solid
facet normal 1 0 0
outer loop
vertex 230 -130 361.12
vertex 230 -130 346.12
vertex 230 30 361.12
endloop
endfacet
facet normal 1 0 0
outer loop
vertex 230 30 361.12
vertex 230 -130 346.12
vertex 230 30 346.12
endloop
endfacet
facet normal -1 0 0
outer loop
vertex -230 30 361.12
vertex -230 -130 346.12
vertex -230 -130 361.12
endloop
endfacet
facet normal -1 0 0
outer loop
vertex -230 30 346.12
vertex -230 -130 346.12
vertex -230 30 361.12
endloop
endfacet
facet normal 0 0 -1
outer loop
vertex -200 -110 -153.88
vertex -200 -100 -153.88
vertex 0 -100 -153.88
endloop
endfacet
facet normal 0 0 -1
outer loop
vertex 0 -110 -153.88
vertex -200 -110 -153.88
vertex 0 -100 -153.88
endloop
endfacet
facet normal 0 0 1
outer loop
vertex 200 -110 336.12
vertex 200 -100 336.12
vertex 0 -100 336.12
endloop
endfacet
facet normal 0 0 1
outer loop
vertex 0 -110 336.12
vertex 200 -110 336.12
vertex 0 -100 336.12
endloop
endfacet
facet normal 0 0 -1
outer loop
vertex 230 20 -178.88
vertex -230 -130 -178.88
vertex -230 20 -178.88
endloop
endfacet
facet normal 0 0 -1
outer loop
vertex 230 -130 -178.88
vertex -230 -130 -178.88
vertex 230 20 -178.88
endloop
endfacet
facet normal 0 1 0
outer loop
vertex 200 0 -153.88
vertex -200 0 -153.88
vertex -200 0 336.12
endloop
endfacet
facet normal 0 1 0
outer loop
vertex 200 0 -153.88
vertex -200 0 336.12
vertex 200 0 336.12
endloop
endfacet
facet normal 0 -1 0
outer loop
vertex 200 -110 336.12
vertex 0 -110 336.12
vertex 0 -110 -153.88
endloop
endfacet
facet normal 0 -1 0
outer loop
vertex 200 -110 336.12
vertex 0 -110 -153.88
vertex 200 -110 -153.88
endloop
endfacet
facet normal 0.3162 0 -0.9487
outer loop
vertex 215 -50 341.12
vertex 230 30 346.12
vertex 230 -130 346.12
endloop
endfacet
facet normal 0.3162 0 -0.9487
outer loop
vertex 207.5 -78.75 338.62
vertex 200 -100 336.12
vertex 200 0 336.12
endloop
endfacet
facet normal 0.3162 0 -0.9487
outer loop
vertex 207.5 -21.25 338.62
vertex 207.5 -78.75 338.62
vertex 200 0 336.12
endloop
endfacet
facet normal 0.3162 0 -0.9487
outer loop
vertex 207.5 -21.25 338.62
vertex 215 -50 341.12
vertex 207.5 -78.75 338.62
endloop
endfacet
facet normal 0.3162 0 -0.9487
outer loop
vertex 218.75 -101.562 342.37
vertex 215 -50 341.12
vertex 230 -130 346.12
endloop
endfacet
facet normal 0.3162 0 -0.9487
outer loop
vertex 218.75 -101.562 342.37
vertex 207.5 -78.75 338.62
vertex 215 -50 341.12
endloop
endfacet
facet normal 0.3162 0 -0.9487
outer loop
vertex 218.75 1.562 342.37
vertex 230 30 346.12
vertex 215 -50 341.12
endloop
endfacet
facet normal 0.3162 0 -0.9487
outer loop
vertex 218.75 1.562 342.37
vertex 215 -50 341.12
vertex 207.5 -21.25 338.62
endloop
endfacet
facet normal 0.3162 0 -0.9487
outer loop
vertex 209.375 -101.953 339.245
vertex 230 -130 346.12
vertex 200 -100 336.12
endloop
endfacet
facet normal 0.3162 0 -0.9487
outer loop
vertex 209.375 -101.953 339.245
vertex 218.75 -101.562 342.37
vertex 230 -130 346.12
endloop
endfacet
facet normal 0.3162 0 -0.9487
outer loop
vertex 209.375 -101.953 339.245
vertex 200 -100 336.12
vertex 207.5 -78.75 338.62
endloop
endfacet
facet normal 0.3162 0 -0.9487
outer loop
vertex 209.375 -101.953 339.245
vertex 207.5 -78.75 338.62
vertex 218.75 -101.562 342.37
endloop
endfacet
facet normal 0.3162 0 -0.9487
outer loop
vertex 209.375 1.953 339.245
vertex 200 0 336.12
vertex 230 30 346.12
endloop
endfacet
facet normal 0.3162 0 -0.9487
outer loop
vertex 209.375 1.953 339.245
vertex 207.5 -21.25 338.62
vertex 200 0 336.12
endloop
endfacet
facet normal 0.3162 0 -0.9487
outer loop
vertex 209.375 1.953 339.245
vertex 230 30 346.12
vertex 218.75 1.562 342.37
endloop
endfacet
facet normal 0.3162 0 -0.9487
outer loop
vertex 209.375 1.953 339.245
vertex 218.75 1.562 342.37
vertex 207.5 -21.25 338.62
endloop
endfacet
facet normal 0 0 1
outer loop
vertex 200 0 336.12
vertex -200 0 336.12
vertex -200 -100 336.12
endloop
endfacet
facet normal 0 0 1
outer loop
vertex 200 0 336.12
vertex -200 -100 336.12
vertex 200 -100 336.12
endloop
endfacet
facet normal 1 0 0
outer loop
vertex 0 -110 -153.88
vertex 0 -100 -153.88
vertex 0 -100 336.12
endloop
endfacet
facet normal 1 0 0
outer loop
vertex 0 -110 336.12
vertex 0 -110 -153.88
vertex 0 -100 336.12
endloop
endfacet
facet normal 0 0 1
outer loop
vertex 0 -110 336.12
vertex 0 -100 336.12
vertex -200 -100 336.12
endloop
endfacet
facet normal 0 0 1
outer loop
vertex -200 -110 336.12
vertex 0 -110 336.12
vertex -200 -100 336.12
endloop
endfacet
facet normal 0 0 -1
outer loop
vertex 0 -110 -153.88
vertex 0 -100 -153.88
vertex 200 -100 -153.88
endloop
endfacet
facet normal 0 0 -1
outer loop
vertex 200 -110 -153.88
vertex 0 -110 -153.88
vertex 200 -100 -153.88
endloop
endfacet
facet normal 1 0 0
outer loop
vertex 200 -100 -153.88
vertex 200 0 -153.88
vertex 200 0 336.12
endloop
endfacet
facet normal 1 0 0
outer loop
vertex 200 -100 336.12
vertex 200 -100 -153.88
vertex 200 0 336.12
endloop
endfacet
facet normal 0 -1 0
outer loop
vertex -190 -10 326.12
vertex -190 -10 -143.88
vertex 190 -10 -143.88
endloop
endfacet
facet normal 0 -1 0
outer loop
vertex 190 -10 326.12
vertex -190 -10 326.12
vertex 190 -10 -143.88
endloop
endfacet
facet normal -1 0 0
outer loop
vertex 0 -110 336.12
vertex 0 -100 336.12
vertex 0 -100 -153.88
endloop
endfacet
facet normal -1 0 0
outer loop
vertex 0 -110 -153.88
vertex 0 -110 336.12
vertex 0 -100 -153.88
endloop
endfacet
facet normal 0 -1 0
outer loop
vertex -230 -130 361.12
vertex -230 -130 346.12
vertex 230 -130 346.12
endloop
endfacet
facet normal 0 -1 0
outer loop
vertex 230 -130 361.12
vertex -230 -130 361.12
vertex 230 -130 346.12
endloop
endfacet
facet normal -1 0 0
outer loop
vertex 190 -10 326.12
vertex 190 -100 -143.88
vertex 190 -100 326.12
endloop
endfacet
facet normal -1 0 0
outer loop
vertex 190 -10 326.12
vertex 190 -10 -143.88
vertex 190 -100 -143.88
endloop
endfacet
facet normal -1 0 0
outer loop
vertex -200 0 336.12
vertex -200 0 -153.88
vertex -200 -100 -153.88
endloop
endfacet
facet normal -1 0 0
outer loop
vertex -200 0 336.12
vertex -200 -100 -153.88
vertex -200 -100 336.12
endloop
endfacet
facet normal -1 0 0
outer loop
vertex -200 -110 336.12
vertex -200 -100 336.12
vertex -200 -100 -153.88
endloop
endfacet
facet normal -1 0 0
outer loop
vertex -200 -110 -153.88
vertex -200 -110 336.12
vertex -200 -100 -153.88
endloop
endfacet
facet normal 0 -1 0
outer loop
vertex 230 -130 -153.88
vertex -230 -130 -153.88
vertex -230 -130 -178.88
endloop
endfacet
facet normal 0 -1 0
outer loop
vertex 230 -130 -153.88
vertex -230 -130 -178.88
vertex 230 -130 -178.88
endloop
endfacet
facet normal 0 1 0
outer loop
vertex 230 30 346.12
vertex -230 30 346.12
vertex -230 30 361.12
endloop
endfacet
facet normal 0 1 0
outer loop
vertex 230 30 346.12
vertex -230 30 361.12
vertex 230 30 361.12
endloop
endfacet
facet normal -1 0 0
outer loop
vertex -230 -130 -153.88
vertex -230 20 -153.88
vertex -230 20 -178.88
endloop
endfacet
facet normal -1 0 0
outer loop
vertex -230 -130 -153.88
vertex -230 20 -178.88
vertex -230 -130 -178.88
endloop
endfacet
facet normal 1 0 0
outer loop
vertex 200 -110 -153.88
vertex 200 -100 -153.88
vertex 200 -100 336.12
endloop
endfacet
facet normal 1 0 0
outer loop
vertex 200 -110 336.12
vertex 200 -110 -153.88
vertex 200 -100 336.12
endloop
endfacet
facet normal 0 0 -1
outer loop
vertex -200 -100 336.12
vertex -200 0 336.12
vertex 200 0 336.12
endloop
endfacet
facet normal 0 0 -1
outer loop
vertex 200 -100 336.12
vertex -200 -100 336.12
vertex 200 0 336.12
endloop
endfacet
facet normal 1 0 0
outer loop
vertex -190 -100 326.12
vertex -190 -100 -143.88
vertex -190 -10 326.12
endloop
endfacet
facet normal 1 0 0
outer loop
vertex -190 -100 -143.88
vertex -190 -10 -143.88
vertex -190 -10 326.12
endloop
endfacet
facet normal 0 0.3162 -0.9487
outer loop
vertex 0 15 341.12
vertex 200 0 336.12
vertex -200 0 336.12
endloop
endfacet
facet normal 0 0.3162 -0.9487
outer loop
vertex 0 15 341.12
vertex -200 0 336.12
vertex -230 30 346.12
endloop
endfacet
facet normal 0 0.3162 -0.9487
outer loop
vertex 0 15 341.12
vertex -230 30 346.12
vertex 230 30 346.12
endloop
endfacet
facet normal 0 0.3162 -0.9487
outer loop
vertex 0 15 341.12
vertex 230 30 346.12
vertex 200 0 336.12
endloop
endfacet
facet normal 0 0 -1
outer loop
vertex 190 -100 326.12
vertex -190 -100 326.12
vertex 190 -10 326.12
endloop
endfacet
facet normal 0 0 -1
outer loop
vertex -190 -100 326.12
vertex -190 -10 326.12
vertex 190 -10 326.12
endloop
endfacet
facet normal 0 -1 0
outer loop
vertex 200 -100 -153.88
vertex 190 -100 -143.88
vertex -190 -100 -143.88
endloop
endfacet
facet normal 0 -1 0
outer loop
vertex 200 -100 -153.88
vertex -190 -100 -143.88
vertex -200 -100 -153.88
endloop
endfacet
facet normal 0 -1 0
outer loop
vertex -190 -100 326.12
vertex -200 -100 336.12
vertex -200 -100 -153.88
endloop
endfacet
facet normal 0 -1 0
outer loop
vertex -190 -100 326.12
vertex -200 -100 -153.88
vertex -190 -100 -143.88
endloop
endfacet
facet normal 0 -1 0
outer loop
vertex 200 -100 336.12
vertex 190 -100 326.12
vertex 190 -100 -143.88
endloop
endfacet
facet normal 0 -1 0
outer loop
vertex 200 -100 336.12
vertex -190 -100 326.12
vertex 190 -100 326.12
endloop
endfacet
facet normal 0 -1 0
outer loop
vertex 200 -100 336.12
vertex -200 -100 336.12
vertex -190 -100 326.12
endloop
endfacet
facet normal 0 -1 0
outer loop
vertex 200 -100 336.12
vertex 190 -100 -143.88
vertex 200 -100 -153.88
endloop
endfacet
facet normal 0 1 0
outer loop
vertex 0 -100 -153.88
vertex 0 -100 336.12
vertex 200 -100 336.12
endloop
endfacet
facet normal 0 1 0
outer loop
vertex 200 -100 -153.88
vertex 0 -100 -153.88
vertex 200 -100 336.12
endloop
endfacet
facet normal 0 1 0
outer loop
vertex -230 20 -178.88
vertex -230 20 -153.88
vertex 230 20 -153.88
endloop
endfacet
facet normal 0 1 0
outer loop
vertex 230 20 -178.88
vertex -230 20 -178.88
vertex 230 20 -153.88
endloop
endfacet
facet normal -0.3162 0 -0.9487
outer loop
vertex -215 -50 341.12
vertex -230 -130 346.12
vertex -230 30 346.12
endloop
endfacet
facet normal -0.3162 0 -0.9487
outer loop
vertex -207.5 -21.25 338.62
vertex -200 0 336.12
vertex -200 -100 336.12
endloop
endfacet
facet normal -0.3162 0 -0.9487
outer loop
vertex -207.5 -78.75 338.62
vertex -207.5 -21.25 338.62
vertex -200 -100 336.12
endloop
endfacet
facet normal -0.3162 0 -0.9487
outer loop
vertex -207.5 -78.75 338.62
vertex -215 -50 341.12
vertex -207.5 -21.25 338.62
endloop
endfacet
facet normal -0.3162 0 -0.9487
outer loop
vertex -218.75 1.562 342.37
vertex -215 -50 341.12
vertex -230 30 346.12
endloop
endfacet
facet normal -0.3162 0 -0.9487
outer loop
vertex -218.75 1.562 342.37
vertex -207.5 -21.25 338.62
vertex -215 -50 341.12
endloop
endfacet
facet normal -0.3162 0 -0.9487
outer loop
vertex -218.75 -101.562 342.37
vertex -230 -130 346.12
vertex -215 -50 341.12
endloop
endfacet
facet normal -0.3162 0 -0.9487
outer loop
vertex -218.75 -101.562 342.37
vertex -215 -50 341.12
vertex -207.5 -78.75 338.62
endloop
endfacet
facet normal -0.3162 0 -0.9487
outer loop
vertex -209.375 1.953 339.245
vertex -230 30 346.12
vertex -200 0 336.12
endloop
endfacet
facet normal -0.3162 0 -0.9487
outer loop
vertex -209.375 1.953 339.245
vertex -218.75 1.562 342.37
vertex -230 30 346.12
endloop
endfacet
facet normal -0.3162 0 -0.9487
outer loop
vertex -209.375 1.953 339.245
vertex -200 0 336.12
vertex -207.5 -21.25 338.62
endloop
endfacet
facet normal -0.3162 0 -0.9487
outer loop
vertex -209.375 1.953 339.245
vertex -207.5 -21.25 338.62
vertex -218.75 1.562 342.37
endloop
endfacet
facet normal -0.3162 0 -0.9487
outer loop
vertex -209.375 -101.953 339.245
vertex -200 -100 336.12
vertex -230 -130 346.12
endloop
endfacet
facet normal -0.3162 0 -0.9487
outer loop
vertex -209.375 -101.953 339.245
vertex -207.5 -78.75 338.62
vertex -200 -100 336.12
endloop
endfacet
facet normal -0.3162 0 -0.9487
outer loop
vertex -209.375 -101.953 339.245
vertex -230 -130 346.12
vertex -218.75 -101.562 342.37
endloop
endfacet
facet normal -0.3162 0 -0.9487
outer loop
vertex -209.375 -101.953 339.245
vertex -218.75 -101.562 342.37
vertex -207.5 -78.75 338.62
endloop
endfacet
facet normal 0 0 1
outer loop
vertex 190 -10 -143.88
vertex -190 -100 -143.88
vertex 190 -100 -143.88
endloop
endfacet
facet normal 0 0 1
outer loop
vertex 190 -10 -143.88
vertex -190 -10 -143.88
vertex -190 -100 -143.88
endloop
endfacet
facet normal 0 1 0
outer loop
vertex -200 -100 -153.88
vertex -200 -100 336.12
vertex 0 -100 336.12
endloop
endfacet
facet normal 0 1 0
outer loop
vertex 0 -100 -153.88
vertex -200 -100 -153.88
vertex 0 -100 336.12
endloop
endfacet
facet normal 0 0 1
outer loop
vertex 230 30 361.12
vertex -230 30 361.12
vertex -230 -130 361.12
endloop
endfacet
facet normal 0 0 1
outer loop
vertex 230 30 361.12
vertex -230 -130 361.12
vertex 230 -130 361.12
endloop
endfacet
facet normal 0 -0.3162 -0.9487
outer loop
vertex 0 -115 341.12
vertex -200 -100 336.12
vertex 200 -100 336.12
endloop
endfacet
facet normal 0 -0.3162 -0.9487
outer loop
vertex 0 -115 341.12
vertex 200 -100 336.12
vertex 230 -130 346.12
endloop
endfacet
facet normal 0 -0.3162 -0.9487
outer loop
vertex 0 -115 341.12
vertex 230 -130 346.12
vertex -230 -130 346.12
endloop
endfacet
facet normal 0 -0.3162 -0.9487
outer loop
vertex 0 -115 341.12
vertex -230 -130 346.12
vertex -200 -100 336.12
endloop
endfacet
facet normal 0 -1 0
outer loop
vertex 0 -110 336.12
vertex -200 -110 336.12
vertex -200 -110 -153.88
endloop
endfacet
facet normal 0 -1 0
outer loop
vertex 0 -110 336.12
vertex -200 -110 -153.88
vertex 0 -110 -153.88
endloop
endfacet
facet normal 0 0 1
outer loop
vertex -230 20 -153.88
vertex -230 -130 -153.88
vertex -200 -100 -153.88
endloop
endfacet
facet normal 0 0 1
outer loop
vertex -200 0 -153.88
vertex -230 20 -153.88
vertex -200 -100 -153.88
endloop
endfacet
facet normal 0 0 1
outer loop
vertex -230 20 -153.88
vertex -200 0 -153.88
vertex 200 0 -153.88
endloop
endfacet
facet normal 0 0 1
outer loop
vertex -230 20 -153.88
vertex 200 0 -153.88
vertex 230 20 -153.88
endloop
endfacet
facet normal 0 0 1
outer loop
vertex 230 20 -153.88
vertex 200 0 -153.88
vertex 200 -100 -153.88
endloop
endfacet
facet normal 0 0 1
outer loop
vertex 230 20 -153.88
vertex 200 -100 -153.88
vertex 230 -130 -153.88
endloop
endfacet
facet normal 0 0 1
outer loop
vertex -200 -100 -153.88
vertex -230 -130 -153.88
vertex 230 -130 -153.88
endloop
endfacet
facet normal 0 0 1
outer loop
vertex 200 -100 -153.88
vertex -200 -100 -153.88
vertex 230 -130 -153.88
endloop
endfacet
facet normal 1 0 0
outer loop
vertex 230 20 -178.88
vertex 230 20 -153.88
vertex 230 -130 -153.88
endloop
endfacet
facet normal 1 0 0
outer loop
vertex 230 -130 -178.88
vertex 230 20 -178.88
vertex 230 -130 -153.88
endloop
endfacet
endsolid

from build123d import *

# Parameters (mm, degrees)
F0_W      = 400
F0_H      = 490
F1_DEPTH  = 100
F2_T      = -10
F4_START  = 10
F3_W      = 460
F3_H      = 160
F4_DEPTH  = 15
F1_FACE_W = 400
F1_FACE_H = 100
F4_FACE_W = 460
F4_FACE_H = 160
F6_W      = 460
F6_H      = 150
F6_W_2    = 400
F6_H_2    = 100
F7_DEPTH  = 25
F8_W      = 190
F8_H      = 470
F9_DEPTH  = 10
F10_DEPTH = 10


with BuildPart() as f1:
    # F0 (on Front) → F1 (new body)
    with BuildSketch(Plane.XZ):
        with Locations((0, 91.1197658628)):
            Rectangle(F0_W, F0_H)
    extrude(amount=F1_DEPTH)

    # F2
    f2_openings = [f1.faces().sort_by_distance(p)[0] for p in [
        (0, -100, 91.119766),
    ]]
    offset(amount=F2_T, openings=f2_openings)

    # F6 (on face) → F7 (join)
    with BuildSketch(Plane(origin=(0, 0, -153.8802341372), x_dir=(1, 0, 0), z_dir=(0, 0, -1))):
        with Locations((0, 55)):
            Rectangle(F6_W, F6_H)
        with Locations((0, 50)):
            Rectangle(F6_W_2, F6_H_2, mode=Mode.SUBTRACT)
        with Locations((0, 50)):
            Rectangle(F6_W_2, F6_H_2)
    extrude(amount=F7_DEPTH)


with BuildPart() as f4:
    # F3 (on face) → F4 (new body)
    with BuildSketch(Plane.XY.offset(336.1197658628).offset(F4_START)):
        with Locations((0, -50)):
            Rectangle(F3_W, F3_H)
    extrude(amount=F4_DEPTH)

    # F1_face (on face) → F5 section 0
    with BuildSketch(Plane(origin=(0, -50, 336.1197658628), x_dir=(1, 0, 0), z_dir=(0, 0, 1))):
        Rectangle(F1_FACE_W, F1_FACE_H)
    # F4_face (on face) → F5 section 1
    with BuildSketch(Plane(origin=(0, -50, 346.1197658628), x_dir=(1, 0, 0), z_dir=(0, 0, -1))):
        Rectangle(F4_FACE_W, F4_FACE_H)
    loft()


with BuildPart() as f9:
    # F8 (on face) → F9 (new body)
    with BuildSketch(Plane.XZ.offset(100)):
        Polygon((200, 336.1197658628), (0, 336.1197658628), (0, 326.1197658628), (190, 326.1197658628), (190, -143.8802341372), (0, -143.8802341372), (0, -153.8802341372), (200, -153.8802341372), align=None)
        with Locations((95, 91.1197658628)):
            Rectangle(F8_W, F8_H)
    extrude(amount=F9_DEPTH)


with BuildPart() as f10:
    # F8 (on face) → F10 (new body)
    with BuildSketch(Plane.XZ.offset(100)):
        with Locations((-95, 91.1197658628)):
            Rectangle(F8_W, F8_H)
        Polygon((0, 326.1197658628), (0, 336.1197658628), (-200, 336.1197658628), (-200, -153.8802341372), (0, -153.8802341372), (0, -143.8802341372), (-190, -143.8802341372), (-190, 326.1197658628), align=None)
    extrude(amount=F10_DEPTH)


solid = Compound([f1.part, f4.part, f9.part, f10.part])
